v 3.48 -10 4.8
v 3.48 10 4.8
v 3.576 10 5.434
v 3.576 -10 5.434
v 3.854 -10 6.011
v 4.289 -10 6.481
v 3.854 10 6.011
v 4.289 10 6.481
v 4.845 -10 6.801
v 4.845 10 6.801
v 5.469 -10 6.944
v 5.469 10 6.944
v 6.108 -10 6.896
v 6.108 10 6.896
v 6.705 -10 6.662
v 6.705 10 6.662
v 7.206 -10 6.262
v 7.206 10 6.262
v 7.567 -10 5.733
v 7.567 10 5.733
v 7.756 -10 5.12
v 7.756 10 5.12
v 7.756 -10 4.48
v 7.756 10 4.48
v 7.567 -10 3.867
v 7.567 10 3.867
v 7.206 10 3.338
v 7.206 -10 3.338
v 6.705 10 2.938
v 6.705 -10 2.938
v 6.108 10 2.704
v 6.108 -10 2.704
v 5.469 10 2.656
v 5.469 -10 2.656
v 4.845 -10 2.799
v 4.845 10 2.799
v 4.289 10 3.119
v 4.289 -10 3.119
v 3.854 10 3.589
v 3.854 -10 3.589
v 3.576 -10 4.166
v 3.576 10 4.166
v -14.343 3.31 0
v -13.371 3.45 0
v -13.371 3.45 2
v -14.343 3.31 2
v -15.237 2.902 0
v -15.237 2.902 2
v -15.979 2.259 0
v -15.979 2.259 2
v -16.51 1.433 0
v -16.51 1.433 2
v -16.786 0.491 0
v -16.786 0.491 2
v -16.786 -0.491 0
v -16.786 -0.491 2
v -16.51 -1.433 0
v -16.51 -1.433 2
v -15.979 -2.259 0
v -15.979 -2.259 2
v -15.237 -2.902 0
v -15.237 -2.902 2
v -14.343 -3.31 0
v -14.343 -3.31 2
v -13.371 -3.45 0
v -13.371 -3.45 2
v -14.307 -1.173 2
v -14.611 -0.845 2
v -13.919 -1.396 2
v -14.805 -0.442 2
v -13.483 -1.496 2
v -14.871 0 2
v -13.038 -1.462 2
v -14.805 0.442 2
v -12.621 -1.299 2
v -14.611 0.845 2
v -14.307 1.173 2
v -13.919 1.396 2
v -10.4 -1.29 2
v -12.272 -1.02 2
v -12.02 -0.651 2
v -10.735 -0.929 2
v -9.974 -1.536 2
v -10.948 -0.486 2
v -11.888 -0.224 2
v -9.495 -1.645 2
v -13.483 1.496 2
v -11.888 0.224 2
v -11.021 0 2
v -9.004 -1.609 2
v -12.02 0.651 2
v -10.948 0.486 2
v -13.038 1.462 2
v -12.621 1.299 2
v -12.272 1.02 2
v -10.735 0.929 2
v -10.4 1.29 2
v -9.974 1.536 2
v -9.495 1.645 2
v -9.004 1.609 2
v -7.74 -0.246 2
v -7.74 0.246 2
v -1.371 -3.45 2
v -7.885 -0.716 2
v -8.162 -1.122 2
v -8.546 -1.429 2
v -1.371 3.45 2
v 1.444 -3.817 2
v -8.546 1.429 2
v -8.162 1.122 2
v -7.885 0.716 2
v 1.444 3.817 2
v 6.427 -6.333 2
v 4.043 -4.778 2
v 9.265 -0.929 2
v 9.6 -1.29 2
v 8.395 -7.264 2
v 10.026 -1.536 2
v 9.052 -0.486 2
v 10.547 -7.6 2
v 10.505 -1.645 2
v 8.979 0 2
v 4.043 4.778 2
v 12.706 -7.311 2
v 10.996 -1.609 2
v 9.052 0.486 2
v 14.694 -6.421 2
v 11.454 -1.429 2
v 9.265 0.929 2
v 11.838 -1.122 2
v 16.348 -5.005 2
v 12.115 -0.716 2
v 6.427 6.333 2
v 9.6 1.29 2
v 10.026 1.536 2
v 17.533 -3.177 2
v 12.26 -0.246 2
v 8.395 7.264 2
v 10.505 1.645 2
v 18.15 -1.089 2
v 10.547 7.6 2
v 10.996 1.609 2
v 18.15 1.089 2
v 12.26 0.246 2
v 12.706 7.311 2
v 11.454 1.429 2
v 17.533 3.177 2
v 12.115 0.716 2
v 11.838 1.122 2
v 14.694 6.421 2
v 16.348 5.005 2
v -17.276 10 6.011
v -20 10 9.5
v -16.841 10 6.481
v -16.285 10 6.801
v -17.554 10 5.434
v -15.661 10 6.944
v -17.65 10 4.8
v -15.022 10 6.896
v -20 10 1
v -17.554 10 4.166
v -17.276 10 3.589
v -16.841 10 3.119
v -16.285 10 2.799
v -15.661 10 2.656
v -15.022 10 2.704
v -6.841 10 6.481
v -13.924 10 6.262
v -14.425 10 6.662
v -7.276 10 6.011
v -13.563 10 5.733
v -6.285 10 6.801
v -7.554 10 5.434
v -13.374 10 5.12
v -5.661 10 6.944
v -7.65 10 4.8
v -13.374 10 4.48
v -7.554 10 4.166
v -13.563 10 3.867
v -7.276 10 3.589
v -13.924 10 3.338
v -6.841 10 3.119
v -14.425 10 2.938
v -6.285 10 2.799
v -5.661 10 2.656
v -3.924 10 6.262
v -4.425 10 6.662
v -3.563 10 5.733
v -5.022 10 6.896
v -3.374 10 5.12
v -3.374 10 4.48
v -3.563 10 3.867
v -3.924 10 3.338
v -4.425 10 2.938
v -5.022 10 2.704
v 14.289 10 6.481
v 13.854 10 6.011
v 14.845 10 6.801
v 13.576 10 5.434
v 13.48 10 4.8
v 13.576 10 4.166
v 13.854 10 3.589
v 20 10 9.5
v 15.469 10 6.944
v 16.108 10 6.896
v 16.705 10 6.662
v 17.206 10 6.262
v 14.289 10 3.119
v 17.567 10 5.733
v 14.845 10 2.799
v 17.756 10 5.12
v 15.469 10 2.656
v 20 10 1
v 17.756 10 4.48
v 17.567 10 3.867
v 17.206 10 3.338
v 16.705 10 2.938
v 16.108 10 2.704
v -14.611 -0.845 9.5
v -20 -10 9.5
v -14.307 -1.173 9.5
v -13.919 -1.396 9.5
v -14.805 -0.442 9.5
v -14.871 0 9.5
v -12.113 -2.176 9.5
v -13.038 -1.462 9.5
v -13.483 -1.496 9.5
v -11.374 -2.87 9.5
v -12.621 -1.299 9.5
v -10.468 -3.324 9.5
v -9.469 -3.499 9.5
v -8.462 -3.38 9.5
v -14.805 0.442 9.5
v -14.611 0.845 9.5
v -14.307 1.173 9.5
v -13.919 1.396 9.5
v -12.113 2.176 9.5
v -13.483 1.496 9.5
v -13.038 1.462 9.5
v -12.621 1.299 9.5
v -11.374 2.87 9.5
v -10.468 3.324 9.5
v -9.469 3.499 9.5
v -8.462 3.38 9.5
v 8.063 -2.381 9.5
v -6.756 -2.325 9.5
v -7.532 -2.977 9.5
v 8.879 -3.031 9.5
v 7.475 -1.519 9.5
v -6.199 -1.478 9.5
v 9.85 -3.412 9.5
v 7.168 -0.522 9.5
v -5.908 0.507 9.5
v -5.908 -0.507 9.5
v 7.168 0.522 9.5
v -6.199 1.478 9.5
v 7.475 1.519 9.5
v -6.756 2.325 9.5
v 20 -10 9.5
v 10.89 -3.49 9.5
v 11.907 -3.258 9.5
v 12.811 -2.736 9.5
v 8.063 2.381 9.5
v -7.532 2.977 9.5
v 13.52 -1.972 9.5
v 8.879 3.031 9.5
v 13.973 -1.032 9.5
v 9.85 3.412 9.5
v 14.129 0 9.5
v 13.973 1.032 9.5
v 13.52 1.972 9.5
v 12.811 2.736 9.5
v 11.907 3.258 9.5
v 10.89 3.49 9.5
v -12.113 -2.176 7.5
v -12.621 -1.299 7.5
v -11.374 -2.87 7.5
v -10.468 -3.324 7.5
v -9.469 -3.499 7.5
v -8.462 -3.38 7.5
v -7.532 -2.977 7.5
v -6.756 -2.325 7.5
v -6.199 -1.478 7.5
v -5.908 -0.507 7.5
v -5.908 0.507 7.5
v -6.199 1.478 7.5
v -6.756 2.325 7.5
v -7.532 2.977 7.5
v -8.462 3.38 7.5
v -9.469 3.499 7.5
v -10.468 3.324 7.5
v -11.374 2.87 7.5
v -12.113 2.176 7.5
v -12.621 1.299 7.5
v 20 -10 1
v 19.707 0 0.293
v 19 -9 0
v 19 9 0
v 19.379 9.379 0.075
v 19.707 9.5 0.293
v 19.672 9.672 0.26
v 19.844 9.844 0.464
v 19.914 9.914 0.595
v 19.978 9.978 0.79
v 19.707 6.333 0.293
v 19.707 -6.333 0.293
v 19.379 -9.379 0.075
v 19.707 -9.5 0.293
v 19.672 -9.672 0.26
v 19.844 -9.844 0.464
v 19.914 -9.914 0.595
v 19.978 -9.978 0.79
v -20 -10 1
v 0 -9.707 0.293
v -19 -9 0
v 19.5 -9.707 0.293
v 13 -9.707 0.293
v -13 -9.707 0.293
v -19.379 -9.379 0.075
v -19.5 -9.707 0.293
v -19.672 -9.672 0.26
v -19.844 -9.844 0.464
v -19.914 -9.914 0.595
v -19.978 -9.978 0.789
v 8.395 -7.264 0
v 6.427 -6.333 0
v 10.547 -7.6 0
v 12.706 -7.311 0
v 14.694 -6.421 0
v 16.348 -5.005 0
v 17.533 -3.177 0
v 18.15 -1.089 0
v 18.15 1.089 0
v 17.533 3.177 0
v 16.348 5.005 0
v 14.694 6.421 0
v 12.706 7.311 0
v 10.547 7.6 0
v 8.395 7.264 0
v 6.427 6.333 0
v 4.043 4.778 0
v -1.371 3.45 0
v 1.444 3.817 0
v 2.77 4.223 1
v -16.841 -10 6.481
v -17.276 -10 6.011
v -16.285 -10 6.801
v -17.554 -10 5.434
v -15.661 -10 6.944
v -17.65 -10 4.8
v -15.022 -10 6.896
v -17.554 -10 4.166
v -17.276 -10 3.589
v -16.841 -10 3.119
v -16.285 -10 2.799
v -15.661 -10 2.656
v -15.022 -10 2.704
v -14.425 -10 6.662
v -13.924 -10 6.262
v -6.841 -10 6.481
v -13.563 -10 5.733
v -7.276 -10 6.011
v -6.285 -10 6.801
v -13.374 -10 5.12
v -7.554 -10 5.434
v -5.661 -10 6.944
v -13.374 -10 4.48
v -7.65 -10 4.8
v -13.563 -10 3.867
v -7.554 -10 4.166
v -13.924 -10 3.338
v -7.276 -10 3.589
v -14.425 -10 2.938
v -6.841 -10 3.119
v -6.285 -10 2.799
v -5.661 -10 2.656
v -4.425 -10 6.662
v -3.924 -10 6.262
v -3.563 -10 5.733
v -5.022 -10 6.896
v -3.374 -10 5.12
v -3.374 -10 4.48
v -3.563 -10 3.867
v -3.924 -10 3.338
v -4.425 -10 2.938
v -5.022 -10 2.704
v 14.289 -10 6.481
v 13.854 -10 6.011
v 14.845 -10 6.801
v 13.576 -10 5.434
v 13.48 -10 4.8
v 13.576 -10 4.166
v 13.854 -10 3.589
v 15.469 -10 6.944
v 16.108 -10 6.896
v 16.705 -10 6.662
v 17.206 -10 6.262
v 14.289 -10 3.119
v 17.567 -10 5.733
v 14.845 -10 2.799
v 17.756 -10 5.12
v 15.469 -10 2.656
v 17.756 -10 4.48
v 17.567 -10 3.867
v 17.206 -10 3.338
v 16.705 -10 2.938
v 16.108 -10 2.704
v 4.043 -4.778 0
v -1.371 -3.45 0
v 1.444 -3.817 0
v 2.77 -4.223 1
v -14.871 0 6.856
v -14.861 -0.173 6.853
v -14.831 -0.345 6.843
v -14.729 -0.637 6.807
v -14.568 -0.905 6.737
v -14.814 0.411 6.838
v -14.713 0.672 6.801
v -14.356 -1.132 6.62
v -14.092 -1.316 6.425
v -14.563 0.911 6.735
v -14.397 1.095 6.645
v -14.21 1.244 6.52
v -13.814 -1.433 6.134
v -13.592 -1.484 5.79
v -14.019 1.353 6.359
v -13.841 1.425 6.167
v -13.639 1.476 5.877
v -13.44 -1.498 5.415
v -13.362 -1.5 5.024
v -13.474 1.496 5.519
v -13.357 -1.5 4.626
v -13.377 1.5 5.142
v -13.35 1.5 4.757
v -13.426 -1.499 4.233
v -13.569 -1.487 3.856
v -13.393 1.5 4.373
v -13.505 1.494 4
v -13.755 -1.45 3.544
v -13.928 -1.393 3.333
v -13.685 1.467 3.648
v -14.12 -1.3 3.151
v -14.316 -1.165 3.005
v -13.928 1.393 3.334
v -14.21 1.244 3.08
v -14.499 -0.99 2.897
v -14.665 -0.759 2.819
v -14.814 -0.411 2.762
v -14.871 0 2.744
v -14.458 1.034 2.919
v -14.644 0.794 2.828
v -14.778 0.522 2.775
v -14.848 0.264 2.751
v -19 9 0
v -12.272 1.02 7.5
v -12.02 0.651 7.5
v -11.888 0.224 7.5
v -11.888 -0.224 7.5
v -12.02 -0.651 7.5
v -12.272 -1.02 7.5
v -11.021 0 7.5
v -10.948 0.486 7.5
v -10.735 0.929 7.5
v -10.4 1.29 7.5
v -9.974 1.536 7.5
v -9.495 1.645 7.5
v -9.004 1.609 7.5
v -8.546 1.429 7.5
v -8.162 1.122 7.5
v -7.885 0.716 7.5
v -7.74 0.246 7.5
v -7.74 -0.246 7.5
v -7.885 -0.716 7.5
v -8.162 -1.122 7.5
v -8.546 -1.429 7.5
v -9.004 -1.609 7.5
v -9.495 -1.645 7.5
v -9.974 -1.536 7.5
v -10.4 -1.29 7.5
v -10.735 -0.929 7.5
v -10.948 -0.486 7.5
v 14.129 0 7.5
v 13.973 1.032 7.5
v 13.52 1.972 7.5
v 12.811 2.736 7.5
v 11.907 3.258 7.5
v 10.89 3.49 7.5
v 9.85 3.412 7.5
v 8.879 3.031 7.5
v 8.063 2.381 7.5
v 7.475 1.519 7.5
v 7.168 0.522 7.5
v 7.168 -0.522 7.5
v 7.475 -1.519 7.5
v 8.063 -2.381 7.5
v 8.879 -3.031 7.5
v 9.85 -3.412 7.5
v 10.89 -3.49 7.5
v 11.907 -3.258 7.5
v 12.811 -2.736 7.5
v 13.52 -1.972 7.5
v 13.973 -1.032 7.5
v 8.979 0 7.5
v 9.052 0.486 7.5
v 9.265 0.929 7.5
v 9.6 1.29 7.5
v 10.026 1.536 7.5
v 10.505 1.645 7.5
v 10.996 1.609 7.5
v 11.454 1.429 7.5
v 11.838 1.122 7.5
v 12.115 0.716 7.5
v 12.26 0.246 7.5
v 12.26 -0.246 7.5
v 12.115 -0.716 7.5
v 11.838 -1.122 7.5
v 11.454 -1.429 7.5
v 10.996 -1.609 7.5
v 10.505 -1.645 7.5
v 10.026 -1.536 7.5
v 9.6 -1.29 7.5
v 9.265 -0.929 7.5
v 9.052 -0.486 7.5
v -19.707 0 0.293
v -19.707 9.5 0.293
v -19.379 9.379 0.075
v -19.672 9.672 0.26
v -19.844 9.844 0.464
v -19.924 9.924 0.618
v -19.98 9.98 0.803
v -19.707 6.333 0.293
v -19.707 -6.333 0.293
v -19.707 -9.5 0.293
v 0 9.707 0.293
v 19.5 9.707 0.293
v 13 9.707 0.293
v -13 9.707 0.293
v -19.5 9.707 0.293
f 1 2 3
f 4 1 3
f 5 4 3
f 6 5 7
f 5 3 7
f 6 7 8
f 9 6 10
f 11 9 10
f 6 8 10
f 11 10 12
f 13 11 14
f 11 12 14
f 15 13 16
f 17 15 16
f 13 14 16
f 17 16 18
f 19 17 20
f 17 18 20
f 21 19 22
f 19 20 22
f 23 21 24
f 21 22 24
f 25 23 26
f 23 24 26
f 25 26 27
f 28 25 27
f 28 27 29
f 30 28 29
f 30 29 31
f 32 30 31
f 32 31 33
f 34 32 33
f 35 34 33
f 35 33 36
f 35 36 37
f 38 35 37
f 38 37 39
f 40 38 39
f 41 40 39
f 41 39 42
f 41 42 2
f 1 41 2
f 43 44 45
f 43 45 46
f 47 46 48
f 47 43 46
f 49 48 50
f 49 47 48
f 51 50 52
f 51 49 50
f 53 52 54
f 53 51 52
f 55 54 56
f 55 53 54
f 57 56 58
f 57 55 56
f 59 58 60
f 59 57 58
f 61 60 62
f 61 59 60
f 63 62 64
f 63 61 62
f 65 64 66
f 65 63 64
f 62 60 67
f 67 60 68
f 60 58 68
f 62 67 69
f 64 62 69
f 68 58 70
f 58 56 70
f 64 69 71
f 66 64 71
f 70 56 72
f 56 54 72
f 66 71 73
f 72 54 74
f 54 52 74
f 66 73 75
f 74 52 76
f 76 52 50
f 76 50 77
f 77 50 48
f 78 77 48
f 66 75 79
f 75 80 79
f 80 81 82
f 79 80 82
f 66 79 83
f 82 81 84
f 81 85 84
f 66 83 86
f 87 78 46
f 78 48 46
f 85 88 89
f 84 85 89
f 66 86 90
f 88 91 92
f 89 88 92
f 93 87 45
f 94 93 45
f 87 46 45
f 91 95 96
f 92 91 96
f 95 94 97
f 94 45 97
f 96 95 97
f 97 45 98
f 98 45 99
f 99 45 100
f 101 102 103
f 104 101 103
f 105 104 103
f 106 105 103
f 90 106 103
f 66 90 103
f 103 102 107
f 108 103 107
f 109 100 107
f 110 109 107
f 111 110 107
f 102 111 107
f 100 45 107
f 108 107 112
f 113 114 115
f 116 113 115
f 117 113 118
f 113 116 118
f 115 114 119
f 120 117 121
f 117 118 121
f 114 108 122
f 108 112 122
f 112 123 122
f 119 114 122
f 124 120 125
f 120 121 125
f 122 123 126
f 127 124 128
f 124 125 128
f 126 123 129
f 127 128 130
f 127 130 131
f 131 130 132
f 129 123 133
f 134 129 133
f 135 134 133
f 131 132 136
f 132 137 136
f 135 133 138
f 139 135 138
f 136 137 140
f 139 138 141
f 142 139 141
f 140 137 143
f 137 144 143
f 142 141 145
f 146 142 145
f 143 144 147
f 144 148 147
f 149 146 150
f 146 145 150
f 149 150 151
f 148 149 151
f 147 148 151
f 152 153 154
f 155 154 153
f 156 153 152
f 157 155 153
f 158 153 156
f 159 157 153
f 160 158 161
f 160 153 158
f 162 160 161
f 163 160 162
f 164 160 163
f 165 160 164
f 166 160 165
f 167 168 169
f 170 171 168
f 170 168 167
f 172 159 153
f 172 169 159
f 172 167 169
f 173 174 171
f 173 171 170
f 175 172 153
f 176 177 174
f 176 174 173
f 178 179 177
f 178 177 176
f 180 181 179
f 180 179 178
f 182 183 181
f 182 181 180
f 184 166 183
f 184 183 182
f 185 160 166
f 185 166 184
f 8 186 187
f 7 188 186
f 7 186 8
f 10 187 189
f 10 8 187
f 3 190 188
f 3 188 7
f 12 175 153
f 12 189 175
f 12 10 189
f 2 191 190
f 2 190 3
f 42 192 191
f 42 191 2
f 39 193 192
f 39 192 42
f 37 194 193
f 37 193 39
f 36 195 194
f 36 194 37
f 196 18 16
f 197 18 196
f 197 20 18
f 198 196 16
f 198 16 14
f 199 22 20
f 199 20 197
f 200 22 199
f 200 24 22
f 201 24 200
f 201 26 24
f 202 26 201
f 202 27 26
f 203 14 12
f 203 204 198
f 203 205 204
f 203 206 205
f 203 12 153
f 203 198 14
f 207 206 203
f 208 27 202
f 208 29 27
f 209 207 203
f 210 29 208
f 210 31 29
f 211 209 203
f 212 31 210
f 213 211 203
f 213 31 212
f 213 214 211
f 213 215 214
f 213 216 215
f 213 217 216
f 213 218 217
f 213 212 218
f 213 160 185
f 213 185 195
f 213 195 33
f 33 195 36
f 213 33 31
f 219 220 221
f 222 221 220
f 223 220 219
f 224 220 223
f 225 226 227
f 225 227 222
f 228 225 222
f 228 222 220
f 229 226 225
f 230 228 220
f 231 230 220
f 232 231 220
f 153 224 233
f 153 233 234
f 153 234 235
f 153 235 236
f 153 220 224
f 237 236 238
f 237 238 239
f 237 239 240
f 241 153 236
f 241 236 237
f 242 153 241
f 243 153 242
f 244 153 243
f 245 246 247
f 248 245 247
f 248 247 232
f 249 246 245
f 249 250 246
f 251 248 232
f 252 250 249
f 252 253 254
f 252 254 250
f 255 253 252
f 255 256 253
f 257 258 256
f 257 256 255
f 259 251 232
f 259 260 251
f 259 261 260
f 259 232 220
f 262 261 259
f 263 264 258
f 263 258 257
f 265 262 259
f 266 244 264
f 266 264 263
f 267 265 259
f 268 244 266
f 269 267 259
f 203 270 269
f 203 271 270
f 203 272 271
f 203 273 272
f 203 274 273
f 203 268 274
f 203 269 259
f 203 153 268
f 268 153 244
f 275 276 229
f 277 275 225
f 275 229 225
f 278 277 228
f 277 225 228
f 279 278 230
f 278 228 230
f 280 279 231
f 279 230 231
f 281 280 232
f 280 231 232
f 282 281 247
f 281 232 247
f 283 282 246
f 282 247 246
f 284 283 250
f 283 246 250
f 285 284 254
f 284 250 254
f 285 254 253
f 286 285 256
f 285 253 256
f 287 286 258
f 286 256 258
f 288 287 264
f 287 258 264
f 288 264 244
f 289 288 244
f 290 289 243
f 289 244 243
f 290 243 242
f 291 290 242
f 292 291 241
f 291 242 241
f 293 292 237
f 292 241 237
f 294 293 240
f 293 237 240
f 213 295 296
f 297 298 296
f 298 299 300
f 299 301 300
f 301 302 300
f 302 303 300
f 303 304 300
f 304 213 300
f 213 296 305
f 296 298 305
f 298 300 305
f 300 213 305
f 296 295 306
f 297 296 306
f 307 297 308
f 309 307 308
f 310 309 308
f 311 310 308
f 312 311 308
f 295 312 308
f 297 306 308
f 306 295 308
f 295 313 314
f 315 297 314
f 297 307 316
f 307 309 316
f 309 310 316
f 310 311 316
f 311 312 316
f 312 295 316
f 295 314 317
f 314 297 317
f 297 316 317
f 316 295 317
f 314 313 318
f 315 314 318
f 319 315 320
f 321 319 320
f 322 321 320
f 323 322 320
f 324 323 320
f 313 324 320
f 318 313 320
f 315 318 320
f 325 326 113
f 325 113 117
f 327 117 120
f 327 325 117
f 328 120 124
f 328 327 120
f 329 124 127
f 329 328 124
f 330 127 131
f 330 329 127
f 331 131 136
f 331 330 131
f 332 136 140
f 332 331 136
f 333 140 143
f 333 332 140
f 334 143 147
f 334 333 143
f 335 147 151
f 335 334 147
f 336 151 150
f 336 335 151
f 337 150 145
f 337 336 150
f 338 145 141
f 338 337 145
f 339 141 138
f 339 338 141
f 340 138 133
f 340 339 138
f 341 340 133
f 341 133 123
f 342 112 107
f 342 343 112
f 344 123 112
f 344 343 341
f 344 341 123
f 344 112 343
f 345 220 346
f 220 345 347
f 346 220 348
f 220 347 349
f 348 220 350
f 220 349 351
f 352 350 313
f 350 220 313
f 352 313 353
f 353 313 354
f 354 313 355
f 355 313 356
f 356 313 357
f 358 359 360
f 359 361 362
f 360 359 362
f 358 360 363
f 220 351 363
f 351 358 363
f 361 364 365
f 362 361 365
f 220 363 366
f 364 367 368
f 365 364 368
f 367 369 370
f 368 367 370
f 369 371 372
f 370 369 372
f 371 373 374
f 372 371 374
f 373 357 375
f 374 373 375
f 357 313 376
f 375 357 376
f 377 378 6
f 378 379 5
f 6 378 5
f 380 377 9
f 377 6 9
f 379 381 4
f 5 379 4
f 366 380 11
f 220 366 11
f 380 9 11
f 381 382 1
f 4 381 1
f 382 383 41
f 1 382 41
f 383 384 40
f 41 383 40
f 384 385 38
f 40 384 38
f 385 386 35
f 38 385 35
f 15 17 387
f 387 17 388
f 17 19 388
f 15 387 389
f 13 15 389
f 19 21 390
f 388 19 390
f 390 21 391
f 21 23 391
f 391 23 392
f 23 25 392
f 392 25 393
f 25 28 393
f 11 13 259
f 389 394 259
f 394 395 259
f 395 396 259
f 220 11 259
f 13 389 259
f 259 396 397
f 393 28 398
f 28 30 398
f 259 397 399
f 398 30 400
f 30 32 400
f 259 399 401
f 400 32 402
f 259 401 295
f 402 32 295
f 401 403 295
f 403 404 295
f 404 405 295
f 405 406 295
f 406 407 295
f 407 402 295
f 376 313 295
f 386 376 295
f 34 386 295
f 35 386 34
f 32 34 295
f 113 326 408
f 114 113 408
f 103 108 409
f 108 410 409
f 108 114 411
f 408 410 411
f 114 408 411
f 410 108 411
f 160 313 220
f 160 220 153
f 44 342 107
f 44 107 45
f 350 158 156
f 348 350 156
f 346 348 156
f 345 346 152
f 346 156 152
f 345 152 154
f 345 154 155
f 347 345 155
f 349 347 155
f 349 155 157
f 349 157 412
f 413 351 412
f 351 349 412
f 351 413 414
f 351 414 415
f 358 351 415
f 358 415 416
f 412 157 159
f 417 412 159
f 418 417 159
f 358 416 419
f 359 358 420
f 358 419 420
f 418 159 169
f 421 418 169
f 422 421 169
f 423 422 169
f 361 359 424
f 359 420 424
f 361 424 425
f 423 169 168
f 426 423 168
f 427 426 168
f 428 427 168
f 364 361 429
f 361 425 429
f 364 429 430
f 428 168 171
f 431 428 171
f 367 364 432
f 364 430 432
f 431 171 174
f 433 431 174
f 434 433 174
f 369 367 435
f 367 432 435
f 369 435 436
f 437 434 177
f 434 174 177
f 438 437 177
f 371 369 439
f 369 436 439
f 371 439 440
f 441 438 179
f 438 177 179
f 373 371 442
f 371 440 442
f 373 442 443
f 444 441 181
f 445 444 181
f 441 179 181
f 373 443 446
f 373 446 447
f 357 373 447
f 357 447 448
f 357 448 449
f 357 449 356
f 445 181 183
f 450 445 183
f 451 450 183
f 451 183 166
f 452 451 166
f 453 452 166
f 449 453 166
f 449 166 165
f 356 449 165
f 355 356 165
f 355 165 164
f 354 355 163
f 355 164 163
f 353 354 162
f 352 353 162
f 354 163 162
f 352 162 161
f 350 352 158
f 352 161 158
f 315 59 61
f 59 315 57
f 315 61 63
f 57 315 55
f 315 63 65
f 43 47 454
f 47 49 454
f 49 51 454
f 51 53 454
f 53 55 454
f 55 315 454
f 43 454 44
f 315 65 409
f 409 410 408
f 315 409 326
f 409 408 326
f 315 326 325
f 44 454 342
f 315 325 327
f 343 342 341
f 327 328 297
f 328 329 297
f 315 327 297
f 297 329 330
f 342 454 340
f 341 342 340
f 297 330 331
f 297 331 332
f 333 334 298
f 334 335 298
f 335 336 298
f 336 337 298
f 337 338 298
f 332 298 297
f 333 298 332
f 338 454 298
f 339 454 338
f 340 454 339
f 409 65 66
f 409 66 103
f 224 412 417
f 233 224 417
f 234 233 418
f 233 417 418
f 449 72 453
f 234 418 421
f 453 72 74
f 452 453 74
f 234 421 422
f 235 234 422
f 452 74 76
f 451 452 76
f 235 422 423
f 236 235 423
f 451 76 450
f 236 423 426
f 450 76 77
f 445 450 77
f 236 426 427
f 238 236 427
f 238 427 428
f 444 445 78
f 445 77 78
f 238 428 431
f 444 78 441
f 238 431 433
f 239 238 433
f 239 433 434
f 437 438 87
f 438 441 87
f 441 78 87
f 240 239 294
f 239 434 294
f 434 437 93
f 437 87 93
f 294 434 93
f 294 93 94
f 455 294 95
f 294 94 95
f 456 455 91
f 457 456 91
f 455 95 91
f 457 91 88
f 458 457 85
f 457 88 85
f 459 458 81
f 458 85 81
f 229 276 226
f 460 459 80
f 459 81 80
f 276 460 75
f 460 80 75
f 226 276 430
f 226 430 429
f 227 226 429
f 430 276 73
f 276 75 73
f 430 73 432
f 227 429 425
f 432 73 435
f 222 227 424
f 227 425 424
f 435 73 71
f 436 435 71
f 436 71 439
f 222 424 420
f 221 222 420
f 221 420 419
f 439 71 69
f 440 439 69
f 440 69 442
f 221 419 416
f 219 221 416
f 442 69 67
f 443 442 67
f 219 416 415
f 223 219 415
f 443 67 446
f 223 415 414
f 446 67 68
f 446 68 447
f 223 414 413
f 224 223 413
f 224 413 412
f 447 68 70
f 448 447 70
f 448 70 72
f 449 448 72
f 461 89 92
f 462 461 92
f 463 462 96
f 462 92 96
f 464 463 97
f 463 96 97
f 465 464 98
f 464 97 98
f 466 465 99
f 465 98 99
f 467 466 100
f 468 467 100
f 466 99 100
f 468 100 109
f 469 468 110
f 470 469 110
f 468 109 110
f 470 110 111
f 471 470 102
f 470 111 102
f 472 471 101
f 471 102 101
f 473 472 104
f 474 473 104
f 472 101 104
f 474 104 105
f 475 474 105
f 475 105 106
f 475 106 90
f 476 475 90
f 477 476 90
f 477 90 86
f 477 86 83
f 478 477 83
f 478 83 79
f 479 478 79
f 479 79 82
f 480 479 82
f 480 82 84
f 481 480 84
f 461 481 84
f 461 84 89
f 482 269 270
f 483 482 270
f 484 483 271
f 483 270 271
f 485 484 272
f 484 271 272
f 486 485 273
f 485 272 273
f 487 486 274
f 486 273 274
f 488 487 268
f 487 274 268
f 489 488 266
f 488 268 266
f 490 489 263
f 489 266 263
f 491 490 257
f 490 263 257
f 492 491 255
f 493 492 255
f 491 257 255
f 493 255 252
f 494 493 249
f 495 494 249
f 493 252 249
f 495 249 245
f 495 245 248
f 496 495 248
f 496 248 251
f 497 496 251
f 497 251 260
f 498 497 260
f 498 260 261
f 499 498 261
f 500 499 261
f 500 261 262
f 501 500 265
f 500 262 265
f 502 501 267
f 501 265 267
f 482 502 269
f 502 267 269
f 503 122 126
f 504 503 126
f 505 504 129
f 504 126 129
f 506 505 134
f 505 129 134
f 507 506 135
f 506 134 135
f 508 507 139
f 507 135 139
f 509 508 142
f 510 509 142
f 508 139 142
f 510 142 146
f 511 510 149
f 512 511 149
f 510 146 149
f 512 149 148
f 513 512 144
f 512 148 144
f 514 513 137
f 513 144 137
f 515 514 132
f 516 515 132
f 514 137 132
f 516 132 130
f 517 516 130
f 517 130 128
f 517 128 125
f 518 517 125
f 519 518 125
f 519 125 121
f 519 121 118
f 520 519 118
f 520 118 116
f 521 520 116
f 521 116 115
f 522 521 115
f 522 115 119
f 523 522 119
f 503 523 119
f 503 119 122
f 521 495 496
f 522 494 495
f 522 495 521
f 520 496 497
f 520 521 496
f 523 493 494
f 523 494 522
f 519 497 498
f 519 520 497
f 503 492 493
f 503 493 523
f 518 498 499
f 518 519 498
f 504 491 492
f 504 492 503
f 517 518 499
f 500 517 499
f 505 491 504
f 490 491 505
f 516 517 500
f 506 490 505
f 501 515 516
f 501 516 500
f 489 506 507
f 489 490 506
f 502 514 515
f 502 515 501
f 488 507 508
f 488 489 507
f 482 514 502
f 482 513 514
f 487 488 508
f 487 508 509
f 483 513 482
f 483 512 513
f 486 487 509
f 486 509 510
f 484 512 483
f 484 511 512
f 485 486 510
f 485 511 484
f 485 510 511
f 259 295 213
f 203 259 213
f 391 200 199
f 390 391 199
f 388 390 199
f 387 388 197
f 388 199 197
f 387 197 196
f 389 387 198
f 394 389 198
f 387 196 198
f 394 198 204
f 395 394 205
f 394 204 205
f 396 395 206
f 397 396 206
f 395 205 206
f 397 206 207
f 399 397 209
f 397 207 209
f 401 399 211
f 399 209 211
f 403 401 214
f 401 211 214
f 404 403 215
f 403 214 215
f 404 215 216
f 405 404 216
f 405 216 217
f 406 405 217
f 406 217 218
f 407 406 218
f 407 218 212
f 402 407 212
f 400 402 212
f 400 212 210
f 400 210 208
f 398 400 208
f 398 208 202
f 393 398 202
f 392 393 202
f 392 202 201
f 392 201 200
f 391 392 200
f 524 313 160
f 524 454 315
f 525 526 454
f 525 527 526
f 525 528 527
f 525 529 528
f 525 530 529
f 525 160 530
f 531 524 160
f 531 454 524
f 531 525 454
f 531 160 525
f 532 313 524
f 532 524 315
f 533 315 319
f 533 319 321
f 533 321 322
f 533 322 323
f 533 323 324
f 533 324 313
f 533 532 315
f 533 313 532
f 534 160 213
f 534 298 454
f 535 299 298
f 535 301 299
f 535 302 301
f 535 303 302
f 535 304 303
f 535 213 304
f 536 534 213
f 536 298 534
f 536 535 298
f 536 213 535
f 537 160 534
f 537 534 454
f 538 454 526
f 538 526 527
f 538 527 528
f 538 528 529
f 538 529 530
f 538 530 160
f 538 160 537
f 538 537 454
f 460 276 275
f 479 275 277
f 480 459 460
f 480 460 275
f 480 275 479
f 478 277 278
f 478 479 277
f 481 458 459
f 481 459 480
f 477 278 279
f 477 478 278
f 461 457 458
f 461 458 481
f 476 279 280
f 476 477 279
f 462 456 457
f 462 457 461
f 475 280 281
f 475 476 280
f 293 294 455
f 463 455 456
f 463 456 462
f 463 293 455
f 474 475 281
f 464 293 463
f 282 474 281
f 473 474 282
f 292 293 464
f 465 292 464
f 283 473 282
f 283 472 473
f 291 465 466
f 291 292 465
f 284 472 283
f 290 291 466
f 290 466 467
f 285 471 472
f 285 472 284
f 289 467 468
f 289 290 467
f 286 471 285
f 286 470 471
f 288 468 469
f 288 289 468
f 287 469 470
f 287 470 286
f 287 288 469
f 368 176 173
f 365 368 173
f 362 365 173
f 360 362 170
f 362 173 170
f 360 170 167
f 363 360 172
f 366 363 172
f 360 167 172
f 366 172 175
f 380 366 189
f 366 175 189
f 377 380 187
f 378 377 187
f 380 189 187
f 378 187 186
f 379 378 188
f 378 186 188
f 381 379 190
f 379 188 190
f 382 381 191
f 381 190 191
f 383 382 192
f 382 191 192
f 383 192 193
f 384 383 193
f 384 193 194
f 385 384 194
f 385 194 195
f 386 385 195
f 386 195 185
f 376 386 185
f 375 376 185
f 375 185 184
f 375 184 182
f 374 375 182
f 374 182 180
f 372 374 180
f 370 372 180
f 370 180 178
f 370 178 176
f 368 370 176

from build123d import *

# Parameters (mm, degrees)
SKETCH1_W           = 40
SKETCH1_H           = 20
BOSS_EXTRUDE1_DEPTH = 9.5
CUT_EXTRUDE1_DEPTH  = 2
FILLET1_R           = 1
SKETCH4_R           = 2.15
CUT_EXTRUDE2_DEPTH  = 30.837057496
SKETCH5_R           = 1.5
SKETCH5_R_2         = 1.65
CUT_EXTRUDE3_DEPTH  = 25.295061227
SKETCH6_R           = 3.5
CUT_EXTRUDE4_DEPTH  = 2


with BuildPart() as part:
    # Sketch1 → Boss-Extrude1 (new body)
    with BuildSketch(Plane.XY):
        Rectangle(SKETCH1_W, SKETCH1_H)
    extrude(amount=BOSS_EXTRUDE1_DEPTH)

    # Sketch3 → Cut-Extrude1 (cut)
    with BuildSketch(Plane(origin=(0, 0, 0), x_dir=(-1, 0, 0), z_dir=(0, 0, -1))):
        with BuildLine():
            Line((13.371397425, -3.45), (1.371397425, -3.45))
            add(Edge.make_bspline(
                [(-6.426606991, -6.332711355), (-3.012827406, -3.55467535), (1.371397425, -3.45)],
                knots=[0, 0, 0, 1, 1, 1], degree=2))
            ThreePointArc((-6.426606991, -6.332711355), (-18.228602575, 0), (-6.426606991, 6.332711355))
            add(Edge.make_bspline(
                [(-6.426606991, 6.332711355), (-3.012827406, 3.55467535), (1.371397425, 3.45)],
                knots=[0, 0, 0, 1, 1, 1], degree=2))
            Line((1.371397425, 3.45), (13.371397425, 3.45))
            ThreePointArc((13.371397425, 3.45), (16.821397425, 0), (13.371397425, -3.45))
        make_face()
    extrude(amount=-CUT_EXTRUDE1_DEPTH, mode=Mode.SUBTRACT)

    # Fillet1
    fillet1_edges = [part.edges().sort_by_distance(p)[0] for p in [
        (-20, 0, 0),
        (0, -10, 0),
        (0, 10, 0),
        (20, 0, 0),
    ]]
    fillet(fillet1_edges, radius=FILLET1_R)

    # Sketch4 → Cut-Extrude2 (cut, through all)
    with BuildSketch(Plane(origin=(0, 10, 0), x_dir=(1, 0, 0), z_dir=(0, 1, 0))):
        with Locations((-15.5, -4.8)):
            Circle(SKETCH4_R)
        with Locations((-5.5, -4.8)):
            Circle(SKETCH4_R)
        with Locations((5.63, -4.8)):
            Circle(SKETCH4_R)
        with Locations((15.63, -4.8)):
            Circle(SKETCH4_R)
    extrude(amount=-CUT_EXTRUDE2_DEPTH, mode=Mode.SUBTRACT)

    # Sketch5 → Cut-Extrude3 (cut, through all)
    with BuildSketch(Plane(origin=(0, 0, 0), x_dir=(-1, 0, 0), z_dir=(0, 0, -1))):
        with Locations((13.371397425, 0)):
            Circle(SKETCH5_R)
        with Locations((9.371397425, 0)):
            Circle(SKETCH5_R_2)
        with Locations((-10.628602575, 0)):
            Circle(SKETCH5_R_2)
    extrude(amount=-CUT_EXTRUDE3_DEPTH, mode=Mode.SUBTRACT)

    # Sketch6 → Cut-Extrude4 (cut)
    with BuildSketch(Plane.XY.offset(9.5)):
        with Locations((10.628602575, 0)):
            Circle(SKETCH6_R)
        with Locations((-9.371397425, 0)):
            Circle(SKETCH6_R)
    extrude(amount=-CUT_EXTRUDE4_DEPTH, mode=Mode.SUBTRACT)


solid = part.part
